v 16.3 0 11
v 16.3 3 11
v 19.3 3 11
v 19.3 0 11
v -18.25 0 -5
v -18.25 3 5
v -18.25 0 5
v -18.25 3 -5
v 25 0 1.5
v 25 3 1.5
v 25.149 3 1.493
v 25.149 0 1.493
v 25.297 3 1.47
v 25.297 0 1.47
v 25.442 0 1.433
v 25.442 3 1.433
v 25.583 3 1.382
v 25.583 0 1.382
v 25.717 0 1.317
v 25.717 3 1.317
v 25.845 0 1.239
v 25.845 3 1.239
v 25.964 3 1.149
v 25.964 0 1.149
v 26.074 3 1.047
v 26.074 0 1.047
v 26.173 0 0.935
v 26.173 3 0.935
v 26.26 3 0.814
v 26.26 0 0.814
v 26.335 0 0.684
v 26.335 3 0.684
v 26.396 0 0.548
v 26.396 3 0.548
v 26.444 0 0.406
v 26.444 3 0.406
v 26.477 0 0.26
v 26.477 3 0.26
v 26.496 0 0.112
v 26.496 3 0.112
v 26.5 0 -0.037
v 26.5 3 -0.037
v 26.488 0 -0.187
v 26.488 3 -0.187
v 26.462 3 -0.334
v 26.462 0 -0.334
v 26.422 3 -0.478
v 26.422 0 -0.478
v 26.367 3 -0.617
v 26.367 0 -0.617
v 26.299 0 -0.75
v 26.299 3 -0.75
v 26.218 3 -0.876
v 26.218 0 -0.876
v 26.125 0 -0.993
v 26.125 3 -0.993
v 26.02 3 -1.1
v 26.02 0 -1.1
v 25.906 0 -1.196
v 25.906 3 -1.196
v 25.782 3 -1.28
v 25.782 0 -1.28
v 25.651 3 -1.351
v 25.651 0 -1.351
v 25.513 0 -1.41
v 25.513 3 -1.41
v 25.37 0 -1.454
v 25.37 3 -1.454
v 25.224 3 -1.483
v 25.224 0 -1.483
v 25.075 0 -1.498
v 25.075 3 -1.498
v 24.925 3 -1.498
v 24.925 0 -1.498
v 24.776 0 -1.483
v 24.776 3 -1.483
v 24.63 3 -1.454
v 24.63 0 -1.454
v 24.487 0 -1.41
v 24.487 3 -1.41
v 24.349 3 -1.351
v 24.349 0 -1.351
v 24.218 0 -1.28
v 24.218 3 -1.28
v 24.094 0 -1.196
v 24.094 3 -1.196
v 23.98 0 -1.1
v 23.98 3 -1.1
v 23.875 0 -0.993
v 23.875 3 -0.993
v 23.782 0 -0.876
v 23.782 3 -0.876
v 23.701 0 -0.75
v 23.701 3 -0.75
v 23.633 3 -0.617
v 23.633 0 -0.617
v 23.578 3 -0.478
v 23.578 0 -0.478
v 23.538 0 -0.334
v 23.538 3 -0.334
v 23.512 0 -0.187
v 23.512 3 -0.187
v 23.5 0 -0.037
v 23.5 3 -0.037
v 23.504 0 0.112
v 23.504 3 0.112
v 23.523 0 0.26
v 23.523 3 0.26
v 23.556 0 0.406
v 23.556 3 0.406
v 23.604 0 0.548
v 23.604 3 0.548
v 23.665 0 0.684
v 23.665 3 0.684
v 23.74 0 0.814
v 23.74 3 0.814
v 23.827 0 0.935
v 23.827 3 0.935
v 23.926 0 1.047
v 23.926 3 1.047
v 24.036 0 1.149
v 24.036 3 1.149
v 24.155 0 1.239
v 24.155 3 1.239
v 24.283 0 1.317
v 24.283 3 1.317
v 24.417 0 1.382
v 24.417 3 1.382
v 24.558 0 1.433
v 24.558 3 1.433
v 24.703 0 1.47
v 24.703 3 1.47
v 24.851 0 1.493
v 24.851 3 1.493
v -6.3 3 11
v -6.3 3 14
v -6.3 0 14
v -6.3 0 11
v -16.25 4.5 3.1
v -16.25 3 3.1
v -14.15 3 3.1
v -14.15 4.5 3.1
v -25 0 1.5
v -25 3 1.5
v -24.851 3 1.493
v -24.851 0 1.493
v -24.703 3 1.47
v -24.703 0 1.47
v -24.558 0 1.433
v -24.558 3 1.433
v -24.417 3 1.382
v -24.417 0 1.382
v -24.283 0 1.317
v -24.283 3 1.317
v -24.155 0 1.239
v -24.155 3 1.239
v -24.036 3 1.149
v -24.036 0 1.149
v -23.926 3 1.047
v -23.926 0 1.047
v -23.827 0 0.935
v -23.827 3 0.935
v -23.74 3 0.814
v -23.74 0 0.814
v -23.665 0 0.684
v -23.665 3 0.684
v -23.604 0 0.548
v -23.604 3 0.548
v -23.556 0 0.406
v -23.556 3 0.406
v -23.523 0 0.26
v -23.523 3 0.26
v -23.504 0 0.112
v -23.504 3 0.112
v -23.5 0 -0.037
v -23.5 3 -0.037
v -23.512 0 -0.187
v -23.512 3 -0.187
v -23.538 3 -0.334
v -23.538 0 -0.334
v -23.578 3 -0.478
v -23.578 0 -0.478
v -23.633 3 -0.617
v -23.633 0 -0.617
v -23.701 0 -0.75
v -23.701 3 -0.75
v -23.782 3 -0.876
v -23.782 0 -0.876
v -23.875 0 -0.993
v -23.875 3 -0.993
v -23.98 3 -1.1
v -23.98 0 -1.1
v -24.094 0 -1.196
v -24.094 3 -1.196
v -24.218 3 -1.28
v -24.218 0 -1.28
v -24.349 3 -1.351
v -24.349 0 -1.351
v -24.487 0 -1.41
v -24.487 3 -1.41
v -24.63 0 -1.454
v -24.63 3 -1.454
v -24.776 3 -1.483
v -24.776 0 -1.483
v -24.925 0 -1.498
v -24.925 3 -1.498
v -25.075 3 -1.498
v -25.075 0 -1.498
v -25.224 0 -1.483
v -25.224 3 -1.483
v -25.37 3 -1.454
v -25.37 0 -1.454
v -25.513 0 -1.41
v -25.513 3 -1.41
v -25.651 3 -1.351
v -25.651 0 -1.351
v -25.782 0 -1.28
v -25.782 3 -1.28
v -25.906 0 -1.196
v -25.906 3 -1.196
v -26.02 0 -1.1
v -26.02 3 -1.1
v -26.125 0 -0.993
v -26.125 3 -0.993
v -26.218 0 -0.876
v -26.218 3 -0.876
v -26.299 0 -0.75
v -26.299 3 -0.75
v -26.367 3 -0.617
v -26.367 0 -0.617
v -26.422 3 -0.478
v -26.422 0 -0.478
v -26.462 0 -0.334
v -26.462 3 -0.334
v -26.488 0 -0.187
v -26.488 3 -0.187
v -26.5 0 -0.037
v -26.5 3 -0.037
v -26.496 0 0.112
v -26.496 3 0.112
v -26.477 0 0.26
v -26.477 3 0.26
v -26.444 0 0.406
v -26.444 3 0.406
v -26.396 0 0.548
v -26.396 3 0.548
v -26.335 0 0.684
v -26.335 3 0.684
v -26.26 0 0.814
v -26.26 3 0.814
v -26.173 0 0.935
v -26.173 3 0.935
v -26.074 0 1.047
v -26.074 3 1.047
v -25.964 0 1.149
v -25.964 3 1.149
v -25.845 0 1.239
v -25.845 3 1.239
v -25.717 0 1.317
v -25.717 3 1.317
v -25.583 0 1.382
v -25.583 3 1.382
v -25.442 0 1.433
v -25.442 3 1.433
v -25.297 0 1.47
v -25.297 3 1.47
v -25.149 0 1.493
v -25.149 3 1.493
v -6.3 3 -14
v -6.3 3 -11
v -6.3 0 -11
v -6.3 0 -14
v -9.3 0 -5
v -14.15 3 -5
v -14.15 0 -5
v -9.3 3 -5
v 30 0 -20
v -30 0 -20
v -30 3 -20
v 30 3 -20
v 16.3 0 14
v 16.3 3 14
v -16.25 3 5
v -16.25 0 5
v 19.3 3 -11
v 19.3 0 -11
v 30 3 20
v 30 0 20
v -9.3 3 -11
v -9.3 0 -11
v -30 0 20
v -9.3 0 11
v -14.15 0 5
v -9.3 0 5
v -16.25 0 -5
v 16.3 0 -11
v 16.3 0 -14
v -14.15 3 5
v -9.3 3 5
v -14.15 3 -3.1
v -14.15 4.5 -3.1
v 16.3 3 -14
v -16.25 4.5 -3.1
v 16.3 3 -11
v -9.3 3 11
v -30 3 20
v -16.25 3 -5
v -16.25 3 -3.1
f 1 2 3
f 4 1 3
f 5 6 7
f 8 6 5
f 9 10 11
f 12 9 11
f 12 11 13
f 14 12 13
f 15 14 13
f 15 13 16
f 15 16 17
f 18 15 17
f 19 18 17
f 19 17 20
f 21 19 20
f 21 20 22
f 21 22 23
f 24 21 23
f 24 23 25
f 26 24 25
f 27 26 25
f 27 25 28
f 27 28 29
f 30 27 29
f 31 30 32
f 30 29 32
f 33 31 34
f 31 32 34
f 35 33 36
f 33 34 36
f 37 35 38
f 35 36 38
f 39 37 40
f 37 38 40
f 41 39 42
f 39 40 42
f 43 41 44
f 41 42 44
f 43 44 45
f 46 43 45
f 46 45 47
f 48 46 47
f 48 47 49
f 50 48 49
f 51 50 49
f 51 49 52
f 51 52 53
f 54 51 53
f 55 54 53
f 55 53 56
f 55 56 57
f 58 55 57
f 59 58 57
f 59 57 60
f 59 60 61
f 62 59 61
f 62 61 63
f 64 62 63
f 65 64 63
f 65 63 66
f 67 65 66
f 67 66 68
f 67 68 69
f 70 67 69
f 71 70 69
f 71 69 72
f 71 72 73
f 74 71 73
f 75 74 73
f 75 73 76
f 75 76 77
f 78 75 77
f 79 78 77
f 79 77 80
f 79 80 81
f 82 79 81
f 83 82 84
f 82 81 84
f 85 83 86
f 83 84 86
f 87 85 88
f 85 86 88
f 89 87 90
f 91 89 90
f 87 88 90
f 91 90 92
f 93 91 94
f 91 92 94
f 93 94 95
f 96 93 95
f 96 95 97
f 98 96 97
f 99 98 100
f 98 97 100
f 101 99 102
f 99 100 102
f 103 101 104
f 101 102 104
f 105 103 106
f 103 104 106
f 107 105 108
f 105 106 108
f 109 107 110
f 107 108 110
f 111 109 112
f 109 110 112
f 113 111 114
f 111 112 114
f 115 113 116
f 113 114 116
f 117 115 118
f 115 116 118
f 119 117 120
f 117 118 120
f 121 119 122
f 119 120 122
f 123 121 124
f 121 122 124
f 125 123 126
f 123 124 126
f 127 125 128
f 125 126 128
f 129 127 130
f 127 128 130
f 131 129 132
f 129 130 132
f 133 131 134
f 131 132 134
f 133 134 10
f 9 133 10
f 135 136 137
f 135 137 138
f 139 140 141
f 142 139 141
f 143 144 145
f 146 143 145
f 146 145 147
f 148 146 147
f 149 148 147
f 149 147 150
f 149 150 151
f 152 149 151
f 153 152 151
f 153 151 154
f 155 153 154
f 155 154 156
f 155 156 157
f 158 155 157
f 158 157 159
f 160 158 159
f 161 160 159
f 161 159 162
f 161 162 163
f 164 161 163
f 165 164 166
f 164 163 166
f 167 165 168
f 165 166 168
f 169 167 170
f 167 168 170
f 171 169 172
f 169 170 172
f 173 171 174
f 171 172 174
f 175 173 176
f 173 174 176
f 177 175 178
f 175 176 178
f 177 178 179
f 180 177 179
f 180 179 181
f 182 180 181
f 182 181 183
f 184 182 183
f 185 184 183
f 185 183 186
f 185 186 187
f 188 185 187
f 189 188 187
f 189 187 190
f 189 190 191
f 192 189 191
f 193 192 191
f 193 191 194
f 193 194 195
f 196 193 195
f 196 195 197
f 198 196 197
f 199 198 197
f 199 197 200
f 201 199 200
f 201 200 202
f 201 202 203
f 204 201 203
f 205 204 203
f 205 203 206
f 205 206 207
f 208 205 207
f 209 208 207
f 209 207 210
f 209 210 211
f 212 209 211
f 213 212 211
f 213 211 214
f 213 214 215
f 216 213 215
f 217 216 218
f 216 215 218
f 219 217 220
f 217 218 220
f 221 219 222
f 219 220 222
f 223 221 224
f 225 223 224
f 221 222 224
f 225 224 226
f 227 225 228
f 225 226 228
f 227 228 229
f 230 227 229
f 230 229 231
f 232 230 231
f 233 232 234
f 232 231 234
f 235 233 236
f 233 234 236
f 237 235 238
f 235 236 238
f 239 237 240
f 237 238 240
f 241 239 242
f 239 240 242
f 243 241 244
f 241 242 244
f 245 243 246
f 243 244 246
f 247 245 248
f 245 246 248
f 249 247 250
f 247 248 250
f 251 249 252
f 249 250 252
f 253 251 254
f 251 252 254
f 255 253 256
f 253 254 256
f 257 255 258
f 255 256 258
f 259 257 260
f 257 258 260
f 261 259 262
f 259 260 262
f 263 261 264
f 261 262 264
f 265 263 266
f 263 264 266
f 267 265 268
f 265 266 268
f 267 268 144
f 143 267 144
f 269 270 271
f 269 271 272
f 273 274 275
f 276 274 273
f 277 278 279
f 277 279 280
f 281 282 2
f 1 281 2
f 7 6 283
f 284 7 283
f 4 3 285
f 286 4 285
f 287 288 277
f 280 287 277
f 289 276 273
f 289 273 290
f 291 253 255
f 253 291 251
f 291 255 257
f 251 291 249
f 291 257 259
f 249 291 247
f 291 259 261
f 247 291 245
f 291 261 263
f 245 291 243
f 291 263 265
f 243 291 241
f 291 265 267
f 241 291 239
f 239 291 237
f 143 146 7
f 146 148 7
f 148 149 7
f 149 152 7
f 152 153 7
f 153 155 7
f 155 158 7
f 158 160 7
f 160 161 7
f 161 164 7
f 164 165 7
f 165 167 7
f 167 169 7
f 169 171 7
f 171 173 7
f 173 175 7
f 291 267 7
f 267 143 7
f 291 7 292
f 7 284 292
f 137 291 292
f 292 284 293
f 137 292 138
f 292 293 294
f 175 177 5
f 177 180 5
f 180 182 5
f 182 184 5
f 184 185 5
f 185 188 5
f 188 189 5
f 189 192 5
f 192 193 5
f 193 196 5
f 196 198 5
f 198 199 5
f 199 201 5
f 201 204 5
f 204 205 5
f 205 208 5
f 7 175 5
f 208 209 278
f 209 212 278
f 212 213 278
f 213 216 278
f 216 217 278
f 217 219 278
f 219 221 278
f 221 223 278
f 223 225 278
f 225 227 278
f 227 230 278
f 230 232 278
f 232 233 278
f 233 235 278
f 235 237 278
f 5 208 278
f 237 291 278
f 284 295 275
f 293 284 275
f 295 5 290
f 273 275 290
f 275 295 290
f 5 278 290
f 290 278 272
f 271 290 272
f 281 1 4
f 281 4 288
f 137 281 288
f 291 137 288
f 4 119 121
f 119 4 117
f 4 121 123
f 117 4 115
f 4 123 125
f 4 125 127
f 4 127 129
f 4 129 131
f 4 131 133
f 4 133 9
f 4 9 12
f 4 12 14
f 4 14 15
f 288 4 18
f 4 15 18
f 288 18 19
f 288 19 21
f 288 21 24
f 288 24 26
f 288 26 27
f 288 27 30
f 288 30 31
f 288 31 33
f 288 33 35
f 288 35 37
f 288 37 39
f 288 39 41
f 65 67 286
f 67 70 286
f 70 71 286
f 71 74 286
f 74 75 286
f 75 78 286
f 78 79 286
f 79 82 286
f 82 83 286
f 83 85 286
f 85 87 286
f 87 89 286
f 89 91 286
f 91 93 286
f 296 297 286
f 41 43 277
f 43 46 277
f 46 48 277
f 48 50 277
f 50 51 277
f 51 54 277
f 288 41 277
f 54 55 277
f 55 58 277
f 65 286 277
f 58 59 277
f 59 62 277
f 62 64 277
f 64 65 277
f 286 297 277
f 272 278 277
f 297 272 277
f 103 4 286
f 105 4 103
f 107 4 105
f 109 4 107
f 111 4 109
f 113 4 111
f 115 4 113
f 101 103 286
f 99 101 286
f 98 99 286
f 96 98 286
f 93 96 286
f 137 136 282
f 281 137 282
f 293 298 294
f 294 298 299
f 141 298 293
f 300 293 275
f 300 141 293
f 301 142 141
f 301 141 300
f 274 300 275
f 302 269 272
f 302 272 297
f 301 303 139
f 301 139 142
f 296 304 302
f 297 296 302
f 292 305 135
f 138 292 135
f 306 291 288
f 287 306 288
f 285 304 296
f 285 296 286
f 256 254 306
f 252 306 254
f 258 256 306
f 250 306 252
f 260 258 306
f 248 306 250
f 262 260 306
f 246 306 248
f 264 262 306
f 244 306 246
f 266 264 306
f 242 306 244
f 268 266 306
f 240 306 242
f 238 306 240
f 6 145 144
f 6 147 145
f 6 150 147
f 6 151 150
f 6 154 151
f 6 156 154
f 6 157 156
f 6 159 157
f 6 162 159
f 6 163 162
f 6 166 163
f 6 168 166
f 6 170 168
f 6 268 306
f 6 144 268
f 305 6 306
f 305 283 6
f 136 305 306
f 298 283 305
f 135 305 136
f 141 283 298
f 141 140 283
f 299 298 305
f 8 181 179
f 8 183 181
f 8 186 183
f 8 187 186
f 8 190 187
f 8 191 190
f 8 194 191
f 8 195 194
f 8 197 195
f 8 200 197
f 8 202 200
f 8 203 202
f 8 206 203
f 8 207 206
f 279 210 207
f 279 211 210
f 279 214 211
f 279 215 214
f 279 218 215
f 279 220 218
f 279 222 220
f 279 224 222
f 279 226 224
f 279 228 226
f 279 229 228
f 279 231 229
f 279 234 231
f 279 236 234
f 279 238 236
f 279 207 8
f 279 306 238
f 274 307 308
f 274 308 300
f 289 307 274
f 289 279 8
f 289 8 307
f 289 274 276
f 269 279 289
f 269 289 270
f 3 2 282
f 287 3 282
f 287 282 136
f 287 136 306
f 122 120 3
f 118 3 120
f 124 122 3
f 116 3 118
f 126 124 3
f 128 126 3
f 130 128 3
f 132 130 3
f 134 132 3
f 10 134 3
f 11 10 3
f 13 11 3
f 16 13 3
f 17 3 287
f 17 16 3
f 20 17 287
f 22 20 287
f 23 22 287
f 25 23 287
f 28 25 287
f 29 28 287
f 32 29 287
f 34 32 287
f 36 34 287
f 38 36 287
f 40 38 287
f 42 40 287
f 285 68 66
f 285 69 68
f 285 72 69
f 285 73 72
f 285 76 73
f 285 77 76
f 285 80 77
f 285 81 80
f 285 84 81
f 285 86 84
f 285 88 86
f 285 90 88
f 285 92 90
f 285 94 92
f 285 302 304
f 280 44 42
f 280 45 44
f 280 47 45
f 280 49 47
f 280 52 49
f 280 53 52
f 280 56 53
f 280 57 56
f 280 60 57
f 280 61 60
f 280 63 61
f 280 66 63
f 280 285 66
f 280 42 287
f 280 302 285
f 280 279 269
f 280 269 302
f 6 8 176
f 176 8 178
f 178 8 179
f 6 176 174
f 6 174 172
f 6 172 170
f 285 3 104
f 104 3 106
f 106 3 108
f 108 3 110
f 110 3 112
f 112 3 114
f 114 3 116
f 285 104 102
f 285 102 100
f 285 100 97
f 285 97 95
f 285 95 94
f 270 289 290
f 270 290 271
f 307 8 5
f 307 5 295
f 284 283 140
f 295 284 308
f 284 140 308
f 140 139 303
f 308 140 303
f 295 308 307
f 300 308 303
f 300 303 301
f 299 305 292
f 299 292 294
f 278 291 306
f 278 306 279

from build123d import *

# Parameters (mm, degrees)
SKETCH1_W           = 60
SKETCH1_H           = 40
MAINBODY_DEPTH      = 3
CUT_EXTRUDE1_REACH  = 38.18
SKETCH2_W           = 28.6
SKETCH2_H           = 28
CUT_EXTRUDE2_REACH  = 38.18
SKETCH7_R           = 1.5
SKETCH8_W           = 3
SKETCH8_H           = 3
BOSS_EXTRUDE2_DEPTH = 3
CUT_EXTRUDE3_REACH  = 38.18
SKETCH9_W           = 4.85
SKETCH9_H           = 10
SKETCH9_W_2         = 2
SKETCH10_W          = 2.1
SKETCH10_H          = 6.2
BOSS_EXTRUDE3_DEPTH = 1.5


with BuildPart() as part:
    # Sketch1 → MainBody (new body)
    with BuildSketch(Plane(origin=(0, 0, 0), x_dir=(1, 0, 0), z_dir=(0, 1, 0))):
        Rectangle(SKETCH1_W, SKETCH1_H)
    extrude(amount=MAINBODY_DEPTH)

    # Sketch2 → Cut-Extrude1 (cut, up to next)
    with BuildSketch(Plane(origin=(0, 3, 0), x_dir=(1, 0, 0), z_dir=(0, 1, 0)), mode=Mode.PRIVATE) as cut_extrude1_sk1:
        with Locations((5, 0)):
            Rectangle(SKETCH2_W, SKETCH2_H)
    cut_extrude1_tool1 = extrude(cut_extrude1_sk1.sketch, amount=-CUT_EXTRUDE1_REACH, mode=Mode.PRIVATE) & part.part
    add(cut_extrude1_tool1.solids().sort_by_distance((5, 3, 0))[0], mode=Mode.SUBTRACT)

    # Sketch7 → Cut-Extrude2 (cut, up to next)
    with BuildSketch(Plane(origin=(0, 3, 0), x_dir=(1, 0, 0), z_dir=(0, 1, 0)), mode=Mode.PRIVATE) as cut_extrude2_sk1:
        with Locations(Location((25, 0, 0), (0, 0, 270))):
            Circle(SKETCH7_R)
    cut_extrude2_tool1 = extrude(cut_extrude2_sk1.sketch, amount=-CUT_EXTRUDE2_REACH, mode=Mode.PRIVATE) & part.part
    # Sketch7 → Cut-Extrude2 (cut, up to next)
    with BuildSketch(Plane(origin=(0, 3, 0), x_dir=(1, 0, 0), z_dir=(0, 1, 0)), mode=Mode.PRIVATE) as cut_extrude2_sk2:
        with Locations(Location((-25, 0, 0), (0, 0, 270))):
            Circle(SKETCH7_R)
    cut_extrude2_tool2 = extrude(cut_extrude2_sk2.sketch, amount=-CUT_EXTRUDE2_REACH, mode=Mode.PRIVATE) & part.part
    add(cut_extrude2_tool1.solids().sort_by_distance((25, 3, 0))[0], mode=Mode.SUBTRACT)
    add(cut_extrude2_tool2.solids().sort_by_distance((-25, 3, 0))[0], mode=Mode.SUBTRACT)

    # Sketch8 → Boss-Extrude2 (add)
    with BuildSketch(Plane(origin=(0, 3, 0), x_dir=(1, 0, 0), z_dir=(0, 1, 0))):
        with Locations((-7.8, 12.5)):
            Rectangle(SKETCH8_W, SKETCH8_H)
        with Locations((-7.8, -12.5)):
            Rectangle(SKETCH8_W, SKETCH8_H)
        with Locations((17.8, -12.5)):
            Rectangle(SKETCH8_W, SKETCH8_H)
        with Locations((17.8, 12.5)):
            Rectangle(SKETCH8_W, SKETCH8_H)
    extrude(amount=-BOSS_EXTRUDE2_DEPTH)

    # Sketch9 → Cut-Extrude3 (cut, up to next)
    with BuildSketch(Plane(origin=(0, 3, 0), x_dir=(1, 0, 0), z_dir=(0, 1, 0)), mode=Mode.PRIVATE) as cut_extrude3_sk1:
        with Locations((-11.725, 0)):
            Rectangle(SKETCH9_W, SKETCH9_H)
    cut_extrude3_tool1 = extrude(cut_extrude3_sk1.sketch, amount=-CUT_EXTRUDE3_REACH, mode=Mode.PRIVATE) & part.part
    # Sketch9 → Cut-Extrude3 (cut, up to next)
    with BuildSketch(Plane(origin=(0, 3, 0), x_dir=(1, 0, 0), z_dir=(0, 1, 0)), mode=Mode.PRIVATE) as cut_extrude3_sk2:
        with Locations((-17.25, 0)):
            Rectangle(SKETCH9_W_2, SKETCH9_H)
    cut_extrude3_tool2 = extrude(cut_extrude3_sk2.sketch, amount=-CUT_EXTRUDE3_REACH, mode=Mode.PRIVATE) & part.part
    add(cut_extrude3_tool1.solids().sort_by_distance((-11.725, 3, 0))[0], mode=Mode.SUBTRACT)
    add(cut_extrude3_tool2.solids().sort_by_distance((-17.25, 3, 0))[0], mode=Mode.SUBTRACT)

    # Sketch10 → Boss-Extrude3 (add)
    with BuildSketch(Plane(origin=(0, 3, 0), x_dir=(1, 0, 0), z_dir=(0, 1, 0))):
        with Locations((-15.2, 0)):
            Rectangle(SKETCH10_W, SKETCH10_H)
    extrude(amount=BOSS_EXTRUDE3_DEPTH)


solid = part.part
